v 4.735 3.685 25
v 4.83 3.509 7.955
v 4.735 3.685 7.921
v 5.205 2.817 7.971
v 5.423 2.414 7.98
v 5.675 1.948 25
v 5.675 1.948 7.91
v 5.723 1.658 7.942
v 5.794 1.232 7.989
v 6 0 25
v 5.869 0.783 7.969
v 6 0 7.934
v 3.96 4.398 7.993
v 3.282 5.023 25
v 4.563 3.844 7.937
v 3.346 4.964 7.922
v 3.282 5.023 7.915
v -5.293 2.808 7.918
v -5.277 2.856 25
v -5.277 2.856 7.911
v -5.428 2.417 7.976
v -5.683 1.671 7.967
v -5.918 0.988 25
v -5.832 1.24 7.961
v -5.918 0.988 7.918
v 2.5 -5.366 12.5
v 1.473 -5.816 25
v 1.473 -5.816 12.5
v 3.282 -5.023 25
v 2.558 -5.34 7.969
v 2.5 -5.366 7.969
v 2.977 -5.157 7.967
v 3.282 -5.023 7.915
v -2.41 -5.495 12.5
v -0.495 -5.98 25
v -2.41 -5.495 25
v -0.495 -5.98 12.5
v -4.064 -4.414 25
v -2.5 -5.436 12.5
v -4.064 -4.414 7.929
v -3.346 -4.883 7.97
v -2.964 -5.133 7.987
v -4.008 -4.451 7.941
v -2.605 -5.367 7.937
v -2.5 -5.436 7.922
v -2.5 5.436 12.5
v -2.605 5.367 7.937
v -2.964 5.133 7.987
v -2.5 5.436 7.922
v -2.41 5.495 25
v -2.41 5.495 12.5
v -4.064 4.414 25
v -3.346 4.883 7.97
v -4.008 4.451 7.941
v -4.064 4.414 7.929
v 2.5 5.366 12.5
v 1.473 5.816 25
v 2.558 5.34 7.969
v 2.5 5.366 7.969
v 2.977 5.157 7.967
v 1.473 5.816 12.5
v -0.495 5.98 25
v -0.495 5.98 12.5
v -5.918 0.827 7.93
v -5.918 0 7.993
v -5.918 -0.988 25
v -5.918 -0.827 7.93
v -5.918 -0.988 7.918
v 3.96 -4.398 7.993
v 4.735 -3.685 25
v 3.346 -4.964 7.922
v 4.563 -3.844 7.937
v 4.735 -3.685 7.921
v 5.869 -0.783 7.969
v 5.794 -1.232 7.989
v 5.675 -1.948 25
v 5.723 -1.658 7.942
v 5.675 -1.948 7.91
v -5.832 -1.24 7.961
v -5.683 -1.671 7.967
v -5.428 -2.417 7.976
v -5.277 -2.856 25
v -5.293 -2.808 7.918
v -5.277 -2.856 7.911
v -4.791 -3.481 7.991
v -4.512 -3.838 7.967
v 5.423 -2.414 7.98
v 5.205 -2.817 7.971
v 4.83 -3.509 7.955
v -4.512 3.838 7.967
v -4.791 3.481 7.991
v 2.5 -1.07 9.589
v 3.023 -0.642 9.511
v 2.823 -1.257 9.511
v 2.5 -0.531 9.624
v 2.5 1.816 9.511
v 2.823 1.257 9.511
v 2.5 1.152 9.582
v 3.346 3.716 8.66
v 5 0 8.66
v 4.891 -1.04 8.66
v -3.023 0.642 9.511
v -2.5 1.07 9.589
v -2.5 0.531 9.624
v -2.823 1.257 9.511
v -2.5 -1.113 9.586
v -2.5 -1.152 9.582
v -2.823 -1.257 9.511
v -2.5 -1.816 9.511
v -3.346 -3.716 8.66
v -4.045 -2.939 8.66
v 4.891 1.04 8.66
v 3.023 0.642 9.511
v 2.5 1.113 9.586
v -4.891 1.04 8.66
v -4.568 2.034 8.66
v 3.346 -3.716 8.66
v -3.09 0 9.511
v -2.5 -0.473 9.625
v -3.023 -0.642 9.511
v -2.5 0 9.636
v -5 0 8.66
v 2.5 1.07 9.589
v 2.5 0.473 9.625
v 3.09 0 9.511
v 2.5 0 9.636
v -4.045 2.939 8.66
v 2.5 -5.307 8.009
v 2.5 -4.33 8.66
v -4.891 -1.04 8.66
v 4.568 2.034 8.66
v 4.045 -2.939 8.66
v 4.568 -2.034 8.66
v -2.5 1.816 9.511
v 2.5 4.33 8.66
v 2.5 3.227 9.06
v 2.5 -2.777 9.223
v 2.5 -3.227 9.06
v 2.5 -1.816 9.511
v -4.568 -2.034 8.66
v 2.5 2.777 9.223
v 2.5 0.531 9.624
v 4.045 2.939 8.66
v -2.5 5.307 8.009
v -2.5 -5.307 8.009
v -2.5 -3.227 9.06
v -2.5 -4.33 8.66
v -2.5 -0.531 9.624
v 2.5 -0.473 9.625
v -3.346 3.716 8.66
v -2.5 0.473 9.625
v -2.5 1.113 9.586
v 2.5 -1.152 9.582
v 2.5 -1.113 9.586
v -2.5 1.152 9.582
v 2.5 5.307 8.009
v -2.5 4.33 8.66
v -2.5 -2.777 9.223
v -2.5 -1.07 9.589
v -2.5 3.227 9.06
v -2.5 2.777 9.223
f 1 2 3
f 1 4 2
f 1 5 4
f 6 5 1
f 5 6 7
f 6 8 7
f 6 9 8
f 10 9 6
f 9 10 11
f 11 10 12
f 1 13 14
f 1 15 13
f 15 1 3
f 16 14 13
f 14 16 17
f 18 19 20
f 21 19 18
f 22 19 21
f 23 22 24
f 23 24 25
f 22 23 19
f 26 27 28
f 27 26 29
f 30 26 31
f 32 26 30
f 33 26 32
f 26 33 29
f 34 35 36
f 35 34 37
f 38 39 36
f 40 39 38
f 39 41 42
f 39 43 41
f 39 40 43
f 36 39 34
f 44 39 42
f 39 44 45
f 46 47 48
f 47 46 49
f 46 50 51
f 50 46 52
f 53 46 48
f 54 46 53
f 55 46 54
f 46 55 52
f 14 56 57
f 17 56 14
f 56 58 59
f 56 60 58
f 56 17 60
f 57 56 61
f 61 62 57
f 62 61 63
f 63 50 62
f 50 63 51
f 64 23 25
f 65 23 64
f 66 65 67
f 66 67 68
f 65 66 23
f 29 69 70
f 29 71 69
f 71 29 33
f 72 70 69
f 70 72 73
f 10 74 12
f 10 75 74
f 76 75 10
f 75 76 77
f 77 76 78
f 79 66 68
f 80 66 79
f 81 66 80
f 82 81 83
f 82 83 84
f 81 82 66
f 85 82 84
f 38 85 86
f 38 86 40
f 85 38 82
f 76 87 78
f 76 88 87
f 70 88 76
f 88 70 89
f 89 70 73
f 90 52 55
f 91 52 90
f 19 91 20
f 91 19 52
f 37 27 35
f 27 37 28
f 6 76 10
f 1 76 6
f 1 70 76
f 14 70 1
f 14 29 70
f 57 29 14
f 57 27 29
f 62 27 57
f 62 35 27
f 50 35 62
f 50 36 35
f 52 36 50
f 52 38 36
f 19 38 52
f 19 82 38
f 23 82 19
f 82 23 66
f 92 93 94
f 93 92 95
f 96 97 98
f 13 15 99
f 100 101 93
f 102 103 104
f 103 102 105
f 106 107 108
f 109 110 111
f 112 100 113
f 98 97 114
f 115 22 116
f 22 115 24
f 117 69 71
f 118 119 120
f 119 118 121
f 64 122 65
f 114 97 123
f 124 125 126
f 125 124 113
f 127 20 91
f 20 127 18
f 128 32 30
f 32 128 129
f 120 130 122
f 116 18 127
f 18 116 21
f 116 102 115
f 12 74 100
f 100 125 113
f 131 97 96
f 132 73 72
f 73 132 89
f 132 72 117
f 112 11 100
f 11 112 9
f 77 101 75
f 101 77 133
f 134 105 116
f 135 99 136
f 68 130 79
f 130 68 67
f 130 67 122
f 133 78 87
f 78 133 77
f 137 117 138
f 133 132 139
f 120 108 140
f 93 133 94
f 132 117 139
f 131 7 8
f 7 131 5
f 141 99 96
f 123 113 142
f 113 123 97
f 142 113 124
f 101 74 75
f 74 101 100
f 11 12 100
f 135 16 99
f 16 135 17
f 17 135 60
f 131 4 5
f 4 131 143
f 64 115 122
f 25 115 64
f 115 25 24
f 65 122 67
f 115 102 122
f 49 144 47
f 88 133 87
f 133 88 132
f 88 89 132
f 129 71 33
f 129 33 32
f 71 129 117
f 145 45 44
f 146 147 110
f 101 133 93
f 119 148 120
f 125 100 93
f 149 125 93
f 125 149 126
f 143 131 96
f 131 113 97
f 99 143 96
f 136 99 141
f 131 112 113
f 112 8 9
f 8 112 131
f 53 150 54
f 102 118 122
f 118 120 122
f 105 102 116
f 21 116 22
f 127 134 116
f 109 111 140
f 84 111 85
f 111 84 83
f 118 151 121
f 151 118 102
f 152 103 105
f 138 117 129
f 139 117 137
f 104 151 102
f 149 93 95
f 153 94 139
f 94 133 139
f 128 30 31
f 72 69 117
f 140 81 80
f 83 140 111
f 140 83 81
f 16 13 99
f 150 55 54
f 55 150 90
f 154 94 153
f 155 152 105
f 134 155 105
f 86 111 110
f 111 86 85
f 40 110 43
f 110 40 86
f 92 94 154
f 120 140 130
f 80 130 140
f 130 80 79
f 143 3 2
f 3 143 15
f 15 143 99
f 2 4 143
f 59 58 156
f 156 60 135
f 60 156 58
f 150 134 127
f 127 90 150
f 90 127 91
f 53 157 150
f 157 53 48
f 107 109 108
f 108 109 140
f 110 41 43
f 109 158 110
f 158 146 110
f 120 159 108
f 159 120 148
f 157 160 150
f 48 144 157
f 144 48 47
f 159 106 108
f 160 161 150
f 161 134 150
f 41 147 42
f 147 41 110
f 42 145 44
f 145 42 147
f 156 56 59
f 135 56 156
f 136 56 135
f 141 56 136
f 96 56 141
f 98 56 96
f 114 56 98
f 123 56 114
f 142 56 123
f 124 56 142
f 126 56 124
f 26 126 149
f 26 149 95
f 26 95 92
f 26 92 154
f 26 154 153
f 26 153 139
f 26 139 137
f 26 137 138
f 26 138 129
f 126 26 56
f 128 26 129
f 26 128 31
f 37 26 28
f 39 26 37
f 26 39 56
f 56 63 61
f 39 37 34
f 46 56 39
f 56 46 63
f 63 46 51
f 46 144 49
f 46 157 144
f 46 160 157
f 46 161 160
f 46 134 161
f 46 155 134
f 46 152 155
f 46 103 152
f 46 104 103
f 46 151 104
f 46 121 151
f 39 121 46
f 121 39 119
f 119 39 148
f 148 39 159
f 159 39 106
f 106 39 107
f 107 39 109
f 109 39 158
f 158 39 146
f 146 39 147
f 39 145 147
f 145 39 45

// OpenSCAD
// Generated by generate_scads.py
difference() {
  union() {
    cylinder(h=15, r=6, center=true);
    cylinder(h=25, r=6, center=false);
    cylinder(h=10, r=8, center=true);
  }
  union() {
    sphere(r=10);
    cube(size=[5,30,25], center=true);
  }
}
